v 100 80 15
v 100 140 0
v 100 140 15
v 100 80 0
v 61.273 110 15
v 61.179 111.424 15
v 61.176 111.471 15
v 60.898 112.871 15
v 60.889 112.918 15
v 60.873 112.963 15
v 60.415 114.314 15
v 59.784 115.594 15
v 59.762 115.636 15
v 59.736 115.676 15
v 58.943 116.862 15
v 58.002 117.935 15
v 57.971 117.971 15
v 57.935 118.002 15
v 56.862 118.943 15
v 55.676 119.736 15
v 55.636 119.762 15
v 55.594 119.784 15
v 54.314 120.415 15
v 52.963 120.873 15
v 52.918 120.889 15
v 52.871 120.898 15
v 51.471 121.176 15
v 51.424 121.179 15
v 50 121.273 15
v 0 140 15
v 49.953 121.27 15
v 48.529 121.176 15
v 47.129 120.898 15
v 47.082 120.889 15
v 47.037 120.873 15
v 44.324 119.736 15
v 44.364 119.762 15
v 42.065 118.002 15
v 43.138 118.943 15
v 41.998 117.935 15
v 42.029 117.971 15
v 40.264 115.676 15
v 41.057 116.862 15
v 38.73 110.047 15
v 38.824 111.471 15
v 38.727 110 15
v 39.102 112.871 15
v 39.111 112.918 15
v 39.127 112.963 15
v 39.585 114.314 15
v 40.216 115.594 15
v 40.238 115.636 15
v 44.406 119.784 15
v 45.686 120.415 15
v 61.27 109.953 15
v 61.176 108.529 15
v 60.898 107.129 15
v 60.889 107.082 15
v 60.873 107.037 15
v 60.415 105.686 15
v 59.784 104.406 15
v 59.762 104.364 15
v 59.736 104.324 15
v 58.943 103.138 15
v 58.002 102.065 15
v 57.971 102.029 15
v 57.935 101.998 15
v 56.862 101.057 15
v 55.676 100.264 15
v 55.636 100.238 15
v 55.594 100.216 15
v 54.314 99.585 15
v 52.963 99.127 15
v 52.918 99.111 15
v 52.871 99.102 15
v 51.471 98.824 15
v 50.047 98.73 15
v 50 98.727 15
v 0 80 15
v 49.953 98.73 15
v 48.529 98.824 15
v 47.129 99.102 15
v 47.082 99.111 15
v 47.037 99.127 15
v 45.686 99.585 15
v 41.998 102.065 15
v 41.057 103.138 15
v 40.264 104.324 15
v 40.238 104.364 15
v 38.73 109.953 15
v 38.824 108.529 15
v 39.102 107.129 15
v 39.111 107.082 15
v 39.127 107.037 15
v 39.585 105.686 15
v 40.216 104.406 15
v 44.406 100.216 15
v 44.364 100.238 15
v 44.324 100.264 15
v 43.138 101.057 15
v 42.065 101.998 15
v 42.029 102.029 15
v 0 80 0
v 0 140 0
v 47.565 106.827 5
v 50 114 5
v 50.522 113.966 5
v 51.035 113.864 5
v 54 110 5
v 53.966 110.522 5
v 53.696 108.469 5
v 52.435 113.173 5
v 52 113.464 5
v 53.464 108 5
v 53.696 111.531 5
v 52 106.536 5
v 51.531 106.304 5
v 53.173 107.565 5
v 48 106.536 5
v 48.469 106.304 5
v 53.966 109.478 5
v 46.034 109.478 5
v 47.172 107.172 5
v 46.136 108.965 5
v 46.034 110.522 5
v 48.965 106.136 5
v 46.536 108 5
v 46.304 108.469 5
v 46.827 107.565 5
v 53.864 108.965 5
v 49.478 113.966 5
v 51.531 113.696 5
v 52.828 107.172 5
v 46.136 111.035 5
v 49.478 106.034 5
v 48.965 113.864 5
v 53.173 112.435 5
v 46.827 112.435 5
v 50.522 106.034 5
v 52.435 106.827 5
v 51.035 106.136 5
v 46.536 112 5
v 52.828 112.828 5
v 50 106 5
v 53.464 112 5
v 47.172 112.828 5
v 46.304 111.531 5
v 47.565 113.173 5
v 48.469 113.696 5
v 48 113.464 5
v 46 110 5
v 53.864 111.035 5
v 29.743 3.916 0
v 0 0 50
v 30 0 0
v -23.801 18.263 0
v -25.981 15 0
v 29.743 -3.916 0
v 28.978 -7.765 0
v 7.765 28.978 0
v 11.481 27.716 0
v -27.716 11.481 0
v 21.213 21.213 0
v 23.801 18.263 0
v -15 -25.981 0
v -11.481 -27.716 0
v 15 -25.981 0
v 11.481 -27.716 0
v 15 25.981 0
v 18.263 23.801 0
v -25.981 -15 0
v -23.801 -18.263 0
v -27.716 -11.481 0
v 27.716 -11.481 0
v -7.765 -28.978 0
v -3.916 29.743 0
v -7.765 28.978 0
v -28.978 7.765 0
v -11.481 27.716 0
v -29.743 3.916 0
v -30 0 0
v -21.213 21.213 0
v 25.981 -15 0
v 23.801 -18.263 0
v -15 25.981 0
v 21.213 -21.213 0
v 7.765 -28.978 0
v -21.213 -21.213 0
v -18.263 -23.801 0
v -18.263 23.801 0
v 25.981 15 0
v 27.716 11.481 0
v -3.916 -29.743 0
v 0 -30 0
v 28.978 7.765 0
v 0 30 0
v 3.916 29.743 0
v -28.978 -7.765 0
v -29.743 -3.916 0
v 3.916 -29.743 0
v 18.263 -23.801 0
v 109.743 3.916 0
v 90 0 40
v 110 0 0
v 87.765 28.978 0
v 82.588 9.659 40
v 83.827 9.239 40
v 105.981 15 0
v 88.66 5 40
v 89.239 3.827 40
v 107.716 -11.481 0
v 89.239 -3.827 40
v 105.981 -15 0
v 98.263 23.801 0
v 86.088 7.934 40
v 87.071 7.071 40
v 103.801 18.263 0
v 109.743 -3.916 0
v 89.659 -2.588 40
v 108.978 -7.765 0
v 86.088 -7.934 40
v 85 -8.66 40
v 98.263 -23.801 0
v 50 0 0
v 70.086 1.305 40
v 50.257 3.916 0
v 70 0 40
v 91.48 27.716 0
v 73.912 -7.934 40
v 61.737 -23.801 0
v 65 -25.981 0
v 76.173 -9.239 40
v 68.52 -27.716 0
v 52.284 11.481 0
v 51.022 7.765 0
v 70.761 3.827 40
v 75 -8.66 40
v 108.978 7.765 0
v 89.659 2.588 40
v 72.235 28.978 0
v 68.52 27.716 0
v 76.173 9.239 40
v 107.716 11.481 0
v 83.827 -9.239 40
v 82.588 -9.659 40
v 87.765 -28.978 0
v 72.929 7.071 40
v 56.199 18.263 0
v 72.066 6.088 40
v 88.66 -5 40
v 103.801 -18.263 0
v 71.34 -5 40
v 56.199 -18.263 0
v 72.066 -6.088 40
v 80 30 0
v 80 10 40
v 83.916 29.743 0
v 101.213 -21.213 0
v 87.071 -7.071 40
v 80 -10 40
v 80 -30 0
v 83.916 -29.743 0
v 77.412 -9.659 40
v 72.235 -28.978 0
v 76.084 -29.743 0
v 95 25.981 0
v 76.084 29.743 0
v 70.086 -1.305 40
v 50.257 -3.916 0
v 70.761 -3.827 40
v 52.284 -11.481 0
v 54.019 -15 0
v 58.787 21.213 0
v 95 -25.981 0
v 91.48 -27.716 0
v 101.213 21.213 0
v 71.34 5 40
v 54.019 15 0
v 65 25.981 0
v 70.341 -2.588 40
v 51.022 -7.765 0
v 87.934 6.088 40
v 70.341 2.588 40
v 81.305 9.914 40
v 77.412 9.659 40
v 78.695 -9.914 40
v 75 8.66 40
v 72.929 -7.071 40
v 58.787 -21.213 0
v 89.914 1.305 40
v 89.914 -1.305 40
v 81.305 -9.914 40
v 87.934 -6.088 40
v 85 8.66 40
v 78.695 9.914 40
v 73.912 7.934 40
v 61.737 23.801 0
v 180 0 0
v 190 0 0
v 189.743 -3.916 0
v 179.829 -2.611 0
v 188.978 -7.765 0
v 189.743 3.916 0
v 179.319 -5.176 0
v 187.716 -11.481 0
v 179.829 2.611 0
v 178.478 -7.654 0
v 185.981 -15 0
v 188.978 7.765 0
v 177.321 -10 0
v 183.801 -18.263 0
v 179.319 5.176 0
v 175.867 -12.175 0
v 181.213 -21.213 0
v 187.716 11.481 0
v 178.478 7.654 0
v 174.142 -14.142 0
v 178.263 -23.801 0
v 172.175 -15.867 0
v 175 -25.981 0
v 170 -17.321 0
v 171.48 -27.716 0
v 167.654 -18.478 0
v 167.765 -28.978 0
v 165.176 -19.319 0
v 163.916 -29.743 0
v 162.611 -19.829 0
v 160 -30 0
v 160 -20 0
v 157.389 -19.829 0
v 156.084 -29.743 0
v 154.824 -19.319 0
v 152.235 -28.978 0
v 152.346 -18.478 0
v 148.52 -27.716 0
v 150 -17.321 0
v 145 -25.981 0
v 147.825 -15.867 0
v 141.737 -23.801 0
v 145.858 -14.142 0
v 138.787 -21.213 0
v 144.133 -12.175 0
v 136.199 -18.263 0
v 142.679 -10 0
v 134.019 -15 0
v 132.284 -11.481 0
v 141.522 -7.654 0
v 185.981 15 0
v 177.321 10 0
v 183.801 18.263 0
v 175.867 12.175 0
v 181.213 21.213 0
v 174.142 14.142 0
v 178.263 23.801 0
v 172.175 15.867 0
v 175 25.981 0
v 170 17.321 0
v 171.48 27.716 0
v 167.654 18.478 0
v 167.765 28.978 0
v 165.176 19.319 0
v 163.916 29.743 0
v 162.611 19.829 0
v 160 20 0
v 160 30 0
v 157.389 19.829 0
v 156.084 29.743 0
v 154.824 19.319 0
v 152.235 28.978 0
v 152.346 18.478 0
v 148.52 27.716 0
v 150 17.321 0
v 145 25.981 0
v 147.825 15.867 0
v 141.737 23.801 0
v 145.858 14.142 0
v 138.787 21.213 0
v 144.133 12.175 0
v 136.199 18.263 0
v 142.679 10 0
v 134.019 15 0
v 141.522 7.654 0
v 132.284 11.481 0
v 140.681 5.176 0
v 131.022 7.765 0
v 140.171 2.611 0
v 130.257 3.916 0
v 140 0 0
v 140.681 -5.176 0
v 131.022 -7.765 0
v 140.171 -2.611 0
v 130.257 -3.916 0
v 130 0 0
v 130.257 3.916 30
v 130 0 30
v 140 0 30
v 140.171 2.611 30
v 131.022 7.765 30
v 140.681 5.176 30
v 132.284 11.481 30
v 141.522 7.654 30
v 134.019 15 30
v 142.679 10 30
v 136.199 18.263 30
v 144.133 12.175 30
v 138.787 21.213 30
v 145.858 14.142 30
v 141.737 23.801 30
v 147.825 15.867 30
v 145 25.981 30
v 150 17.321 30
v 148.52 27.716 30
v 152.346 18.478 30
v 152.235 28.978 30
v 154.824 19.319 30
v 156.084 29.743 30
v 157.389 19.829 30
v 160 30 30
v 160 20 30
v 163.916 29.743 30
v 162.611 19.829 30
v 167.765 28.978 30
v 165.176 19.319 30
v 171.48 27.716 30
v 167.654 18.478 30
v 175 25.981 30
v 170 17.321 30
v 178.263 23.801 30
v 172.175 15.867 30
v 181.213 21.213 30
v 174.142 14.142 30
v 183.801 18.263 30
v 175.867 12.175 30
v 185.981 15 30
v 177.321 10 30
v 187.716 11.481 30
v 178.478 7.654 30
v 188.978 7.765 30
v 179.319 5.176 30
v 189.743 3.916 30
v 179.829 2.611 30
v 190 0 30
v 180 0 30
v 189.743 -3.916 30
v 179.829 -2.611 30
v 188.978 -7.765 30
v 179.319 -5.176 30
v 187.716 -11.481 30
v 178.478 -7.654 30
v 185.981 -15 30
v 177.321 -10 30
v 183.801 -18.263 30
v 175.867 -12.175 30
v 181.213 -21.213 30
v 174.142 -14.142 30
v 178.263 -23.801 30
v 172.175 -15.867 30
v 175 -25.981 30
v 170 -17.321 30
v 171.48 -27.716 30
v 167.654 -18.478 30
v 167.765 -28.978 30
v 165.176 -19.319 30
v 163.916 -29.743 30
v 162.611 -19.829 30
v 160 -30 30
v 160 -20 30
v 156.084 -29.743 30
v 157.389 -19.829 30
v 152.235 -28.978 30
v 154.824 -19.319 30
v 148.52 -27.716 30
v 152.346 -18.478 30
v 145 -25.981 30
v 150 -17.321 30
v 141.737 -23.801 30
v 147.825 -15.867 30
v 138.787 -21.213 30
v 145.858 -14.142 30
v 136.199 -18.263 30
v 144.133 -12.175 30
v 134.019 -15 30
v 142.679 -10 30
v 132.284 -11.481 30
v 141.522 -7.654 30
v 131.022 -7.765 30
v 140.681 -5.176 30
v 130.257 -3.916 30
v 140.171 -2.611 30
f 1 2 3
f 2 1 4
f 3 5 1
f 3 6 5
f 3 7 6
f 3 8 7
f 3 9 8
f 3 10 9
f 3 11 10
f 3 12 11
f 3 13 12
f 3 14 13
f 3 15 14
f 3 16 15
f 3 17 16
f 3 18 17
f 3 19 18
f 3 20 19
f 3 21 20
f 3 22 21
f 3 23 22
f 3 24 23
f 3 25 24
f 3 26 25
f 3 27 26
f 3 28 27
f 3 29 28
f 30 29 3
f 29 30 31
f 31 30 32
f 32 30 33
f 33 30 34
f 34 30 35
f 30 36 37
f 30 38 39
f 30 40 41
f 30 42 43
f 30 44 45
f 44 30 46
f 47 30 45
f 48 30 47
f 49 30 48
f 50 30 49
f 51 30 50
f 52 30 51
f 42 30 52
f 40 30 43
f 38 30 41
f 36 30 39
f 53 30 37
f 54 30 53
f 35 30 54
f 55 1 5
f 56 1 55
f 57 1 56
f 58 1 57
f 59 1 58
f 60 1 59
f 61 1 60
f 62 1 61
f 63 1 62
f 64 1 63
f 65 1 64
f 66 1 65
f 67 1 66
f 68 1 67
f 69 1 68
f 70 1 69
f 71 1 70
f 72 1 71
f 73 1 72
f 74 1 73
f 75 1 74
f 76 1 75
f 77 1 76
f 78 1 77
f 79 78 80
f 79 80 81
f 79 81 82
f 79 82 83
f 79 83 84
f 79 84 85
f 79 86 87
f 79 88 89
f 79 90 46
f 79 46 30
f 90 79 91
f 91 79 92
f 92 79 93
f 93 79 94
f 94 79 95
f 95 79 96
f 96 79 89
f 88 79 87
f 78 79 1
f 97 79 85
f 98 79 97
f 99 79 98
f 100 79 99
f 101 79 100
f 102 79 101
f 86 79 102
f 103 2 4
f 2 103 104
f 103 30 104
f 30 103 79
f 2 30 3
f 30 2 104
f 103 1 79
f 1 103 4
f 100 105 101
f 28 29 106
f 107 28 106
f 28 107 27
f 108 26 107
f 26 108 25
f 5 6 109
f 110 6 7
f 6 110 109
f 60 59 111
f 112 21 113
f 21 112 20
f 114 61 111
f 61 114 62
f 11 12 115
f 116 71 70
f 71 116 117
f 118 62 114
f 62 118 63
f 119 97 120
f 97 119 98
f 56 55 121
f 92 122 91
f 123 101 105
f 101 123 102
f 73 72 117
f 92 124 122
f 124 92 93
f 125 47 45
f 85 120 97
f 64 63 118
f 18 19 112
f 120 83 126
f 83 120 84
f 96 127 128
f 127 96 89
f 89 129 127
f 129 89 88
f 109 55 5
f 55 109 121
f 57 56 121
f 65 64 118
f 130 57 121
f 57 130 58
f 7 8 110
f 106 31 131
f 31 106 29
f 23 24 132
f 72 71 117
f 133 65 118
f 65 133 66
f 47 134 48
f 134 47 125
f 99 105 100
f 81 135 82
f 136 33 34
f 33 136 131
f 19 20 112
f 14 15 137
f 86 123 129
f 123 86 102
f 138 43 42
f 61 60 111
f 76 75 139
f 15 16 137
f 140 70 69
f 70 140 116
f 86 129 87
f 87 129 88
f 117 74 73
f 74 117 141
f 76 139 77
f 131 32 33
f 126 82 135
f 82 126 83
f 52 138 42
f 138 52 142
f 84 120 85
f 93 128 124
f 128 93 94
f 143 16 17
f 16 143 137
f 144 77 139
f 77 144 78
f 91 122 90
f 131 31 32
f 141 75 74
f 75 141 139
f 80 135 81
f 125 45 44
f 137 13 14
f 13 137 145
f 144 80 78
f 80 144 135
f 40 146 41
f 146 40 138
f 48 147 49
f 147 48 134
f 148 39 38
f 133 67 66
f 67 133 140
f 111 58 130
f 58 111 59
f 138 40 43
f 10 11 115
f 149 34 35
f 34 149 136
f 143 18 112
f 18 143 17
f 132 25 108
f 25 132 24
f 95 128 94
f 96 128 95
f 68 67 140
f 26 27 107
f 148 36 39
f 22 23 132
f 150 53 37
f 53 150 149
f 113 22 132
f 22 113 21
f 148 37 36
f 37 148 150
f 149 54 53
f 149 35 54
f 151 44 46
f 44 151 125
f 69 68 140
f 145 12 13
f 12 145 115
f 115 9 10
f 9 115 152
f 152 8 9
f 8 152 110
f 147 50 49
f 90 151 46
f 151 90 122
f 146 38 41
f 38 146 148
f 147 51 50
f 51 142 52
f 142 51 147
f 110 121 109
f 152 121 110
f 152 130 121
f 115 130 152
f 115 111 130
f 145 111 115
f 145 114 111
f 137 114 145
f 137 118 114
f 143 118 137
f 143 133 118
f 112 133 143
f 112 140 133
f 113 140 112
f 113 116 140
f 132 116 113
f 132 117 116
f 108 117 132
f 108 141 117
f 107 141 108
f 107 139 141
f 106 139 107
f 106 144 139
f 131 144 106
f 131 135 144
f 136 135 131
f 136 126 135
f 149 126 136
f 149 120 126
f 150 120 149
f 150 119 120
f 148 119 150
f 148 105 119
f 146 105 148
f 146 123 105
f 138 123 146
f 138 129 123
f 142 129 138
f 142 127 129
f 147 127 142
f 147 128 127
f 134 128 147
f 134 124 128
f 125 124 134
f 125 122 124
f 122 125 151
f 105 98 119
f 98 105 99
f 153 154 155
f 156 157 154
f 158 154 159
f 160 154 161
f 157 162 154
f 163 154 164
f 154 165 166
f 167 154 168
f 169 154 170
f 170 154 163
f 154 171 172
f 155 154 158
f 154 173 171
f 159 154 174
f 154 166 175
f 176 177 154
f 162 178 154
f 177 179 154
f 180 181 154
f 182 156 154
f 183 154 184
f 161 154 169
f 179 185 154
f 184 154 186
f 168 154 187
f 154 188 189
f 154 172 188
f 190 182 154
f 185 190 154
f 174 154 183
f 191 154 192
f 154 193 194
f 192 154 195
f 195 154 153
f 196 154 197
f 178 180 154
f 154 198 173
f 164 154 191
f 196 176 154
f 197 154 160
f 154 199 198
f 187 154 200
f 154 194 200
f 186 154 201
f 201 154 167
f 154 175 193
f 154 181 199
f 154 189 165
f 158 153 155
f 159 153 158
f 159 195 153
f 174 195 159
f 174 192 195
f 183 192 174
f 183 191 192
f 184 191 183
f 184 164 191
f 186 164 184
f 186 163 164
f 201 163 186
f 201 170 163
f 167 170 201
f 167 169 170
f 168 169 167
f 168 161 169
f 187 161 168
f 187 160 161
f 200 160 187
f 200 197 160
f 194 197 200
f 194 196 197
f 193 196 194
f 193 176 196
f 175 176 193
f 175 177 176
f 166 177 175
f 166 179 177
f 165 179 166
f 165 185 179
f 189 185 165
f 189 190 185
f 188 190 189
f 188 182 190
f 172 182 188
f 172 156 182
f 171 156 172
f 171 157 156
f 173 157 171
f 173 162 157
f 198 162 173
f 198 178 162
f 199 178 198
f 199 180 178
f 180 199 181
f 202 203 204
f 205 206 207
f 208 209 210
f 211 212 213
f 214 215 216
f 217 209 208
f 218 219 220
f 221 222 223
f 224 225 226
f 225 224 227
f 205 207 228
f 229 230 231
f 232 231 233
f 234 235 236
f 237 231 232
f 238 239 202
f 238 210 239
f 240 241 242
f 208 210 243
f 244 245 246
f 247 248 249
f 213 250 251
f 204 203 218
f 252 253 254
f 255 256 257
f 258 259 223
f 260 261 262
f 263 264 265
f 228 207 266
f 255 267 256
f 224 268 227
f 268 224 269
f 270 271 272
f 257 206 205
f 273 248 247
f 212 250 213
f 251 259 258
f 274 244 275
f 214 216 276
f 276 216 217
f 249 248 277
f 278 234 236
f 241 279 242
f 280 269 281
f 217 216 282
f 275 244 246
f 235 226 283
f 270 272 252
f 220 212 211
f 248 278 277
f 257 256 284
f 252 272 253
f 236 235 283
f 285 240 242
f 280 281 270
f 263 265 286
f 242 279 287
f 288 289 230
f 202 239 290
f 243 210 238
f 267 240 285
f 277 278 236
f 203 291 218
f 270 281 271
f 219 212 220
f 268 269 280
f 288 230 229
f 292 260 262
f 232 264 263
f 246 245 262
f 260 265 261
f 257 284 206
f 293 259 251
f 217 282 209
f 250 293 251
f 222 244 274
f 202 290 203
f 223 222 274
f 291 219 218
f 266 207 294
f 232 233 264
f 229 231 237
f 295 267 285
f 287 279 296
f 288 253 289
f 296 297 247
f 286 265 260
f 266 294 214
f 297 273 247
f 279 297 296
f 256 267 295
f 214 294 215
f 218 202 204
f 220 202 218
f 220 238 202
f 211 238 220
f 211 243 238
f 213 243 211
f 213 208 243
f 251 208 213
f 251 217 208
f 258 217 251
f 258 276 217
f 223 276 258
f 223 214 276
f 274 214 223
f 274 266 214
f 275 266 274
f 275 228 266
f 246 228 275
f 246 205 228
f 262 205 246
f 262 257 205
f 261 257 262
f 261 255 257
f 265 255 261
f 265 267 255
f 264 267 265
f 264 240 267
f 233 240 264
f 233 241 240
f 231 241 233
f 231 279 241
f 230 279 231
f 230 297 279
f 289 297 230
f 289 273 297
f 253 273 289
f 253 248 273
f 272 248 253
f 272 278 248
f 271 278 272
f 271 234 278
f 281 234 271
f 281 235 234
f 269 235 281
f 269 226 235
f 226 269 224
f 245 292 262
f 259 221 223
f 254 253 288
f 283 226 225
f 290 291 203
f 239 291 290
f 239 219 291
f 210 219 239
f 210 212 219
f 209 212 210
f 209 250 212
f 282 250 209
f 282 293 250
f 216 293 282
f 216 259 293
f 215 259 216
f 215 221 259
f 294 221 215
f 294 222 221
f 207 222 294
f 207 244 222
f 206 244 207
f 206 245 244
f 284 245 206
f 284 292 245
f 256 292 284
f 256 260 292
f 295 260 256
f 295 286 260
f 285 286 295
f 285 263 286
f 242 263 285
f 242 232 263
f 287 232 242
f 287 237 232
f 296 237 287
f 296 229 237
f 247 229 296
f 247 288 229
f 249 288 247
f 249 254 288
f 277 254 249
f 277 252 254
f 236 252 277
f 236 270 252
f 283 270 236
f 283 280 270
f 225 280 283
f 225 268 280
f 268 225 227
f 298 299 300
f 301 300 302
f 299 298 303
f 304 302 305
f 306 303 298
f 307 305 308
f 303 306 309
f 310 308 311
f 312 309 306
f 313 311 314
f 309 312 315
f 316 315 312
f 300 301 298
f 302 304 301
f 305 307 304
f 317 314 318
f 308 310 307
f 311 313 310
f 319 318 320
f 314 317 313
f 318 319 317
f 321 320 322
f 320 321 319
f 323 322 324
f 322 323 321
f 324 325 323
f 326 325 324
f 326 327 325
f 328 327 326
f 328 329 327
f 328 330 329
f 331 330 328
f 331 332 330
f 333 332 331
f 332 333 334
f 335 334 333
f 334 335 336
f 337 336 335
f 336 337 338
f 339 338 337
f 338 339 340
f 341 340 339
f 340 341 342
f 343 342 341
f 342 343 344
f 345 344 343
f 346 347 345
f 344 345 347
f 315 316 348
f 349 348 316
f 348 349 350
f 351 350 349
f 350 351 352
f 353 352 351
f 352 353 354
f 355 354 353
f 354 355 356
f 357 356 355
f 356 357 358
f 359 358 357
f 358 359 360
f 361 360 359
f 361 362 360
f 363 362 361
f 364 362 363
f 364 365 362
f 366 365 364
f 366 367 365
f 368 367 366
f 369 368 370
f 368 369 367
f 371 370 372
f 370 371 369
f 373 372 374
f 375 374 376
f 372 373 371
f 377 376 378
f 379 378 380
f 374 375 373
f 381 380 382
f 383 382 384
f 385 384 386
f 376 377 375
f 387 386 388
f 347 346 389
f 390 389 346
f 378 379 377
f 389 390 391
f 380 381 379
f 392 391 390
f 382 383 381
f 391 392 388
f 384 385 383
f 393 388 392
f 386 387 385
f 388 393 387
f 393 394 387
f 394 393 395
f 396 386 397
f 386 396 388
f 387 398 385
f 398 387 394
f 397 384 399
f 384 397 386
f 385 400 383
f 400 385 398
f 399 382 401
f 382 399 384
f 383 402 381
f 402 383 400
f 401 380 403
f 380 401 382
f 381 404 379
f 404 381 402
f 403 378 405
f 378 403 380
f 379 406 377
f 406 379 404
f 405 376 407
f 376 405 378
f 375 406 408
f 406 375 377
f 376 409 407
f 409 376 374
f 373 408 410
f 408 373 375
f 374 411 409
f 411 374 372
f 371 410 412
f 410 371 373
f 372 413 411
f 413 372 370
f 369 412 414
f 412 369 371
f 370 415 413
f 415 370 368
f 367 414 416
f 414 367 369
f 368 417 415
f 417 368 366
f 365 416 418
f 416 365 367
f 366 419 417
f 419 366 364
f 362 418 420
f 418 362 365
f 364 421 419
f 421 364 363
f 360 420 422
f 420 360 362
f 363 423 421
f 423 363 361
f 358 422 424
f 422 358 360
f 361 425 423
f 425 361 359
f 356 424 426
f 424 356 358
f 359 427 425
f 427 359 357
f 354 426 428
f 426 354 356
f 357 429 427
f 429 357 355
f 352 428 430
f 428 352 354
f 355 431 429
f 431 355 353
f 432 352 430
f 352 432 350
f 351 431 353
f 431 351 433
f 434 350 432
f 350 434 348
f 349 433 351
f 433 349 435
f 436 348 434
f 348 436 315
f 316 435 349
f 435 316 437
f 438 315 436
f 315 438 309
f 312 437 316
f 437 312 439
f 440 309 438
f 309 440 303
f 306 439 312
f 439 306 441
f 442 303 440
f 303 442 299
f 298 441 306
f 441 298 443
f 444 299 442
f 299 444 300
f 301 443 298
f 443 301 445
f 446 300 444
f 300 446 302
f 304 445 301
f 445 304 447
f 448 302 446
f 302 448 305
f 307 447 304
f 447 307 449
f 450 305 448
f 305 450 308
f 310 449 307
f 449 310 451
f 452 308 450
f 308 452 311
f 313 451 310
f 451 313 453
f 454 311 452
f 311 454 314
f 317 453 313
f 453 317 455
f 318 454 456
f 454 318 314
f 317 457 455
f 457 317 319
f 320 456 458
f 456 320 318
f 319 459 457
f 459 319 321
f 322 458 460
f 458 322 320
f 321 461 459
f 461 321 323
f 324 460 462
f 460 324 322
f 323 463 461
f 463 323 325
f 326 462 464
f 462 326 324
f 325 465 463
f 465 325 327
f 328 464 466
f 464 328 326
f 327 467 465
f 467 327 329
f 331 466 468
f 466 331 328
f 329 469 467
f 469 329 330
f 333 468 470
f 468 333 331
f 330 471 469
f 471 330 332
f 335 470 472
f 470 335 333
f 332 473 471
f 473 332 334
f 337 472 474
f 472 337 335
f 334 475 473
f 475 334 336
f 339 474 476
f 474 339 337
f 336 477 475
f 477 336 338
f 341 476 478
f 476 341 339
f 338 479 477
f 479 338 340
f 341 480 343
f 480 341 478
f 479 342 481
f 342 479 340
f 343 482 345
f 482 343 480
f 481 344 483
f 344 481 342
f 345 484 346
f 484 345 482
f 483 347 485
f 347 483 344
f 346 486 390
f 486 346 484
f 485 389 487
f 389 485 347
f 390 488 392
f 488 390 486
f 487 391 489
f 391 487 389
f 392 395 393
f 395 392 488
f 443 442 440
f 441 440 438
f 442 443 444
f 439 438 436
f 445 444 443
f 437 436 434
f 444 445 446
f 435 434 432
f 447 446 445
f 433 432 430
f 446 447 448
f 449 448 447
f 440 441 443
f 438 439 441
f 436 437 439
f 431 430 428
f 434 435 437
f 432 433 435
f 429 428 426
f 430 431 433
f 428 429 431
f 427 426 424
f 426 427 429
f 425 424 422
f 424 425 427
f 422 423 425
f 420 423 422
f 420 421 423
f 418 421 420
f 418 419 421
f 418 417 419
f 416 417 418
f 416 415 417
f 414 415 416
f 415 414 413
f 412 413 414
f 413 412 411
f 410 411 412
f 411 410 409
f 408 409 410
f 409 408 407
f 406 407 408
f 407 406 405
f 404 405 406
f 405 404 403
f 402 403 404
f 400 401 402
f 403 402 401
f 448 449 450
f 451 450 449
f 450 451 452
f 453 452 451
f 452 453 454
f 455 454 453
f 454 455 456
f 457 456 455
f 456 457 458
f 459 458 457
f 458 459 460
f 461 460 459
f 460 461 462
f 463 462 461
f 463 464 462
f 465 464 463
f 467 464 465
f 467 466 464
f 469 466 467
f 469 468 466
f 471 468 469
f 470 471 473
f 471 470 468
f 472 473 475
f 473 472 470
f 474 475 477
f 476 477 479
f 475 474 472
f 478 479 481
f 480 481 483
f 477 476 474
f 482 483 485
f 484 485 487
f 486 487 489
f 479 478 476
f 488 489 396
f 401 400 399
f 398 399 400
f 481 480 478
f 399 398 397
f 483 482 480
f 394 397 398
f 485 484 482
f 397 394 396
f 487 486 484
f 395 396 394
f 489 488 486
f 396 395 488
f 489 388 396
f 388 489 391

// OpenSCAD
// Solids of revolution: a cone, a frustum, a tube, and a countersunk hole.
//
// A cylinder with two radii is the revolution of a trapezoid, a rotate_extrude the revolution of
// its outline. Each straight run of the profile is one face — a cylinder, a cone, or an annulus
// — the rims between them are the edges, and a cone's grazing lines follow the camera.

$fn = 48;

// @group Revolved
    // @name Cone
    cylinder(h = 50, r1 = 30, r2 = 0);
    // @name Frustum
    translate([80, 0, 0]) cylinder(h = 40, r1 = 30, r2 = 10);
    // @name Tube
    translate([160, 0, 0]) rotate_extrude() translate([20, 0]) square([10, 30]);
    // @name Countersunk board
    translate([0, 80, 0]) difference() {
        cube([100, 60, 15]);
        translate([50, 30, 5]) cylinder(h = 11, r1 = 4, r2 = 12);
    }
// @endgroup
